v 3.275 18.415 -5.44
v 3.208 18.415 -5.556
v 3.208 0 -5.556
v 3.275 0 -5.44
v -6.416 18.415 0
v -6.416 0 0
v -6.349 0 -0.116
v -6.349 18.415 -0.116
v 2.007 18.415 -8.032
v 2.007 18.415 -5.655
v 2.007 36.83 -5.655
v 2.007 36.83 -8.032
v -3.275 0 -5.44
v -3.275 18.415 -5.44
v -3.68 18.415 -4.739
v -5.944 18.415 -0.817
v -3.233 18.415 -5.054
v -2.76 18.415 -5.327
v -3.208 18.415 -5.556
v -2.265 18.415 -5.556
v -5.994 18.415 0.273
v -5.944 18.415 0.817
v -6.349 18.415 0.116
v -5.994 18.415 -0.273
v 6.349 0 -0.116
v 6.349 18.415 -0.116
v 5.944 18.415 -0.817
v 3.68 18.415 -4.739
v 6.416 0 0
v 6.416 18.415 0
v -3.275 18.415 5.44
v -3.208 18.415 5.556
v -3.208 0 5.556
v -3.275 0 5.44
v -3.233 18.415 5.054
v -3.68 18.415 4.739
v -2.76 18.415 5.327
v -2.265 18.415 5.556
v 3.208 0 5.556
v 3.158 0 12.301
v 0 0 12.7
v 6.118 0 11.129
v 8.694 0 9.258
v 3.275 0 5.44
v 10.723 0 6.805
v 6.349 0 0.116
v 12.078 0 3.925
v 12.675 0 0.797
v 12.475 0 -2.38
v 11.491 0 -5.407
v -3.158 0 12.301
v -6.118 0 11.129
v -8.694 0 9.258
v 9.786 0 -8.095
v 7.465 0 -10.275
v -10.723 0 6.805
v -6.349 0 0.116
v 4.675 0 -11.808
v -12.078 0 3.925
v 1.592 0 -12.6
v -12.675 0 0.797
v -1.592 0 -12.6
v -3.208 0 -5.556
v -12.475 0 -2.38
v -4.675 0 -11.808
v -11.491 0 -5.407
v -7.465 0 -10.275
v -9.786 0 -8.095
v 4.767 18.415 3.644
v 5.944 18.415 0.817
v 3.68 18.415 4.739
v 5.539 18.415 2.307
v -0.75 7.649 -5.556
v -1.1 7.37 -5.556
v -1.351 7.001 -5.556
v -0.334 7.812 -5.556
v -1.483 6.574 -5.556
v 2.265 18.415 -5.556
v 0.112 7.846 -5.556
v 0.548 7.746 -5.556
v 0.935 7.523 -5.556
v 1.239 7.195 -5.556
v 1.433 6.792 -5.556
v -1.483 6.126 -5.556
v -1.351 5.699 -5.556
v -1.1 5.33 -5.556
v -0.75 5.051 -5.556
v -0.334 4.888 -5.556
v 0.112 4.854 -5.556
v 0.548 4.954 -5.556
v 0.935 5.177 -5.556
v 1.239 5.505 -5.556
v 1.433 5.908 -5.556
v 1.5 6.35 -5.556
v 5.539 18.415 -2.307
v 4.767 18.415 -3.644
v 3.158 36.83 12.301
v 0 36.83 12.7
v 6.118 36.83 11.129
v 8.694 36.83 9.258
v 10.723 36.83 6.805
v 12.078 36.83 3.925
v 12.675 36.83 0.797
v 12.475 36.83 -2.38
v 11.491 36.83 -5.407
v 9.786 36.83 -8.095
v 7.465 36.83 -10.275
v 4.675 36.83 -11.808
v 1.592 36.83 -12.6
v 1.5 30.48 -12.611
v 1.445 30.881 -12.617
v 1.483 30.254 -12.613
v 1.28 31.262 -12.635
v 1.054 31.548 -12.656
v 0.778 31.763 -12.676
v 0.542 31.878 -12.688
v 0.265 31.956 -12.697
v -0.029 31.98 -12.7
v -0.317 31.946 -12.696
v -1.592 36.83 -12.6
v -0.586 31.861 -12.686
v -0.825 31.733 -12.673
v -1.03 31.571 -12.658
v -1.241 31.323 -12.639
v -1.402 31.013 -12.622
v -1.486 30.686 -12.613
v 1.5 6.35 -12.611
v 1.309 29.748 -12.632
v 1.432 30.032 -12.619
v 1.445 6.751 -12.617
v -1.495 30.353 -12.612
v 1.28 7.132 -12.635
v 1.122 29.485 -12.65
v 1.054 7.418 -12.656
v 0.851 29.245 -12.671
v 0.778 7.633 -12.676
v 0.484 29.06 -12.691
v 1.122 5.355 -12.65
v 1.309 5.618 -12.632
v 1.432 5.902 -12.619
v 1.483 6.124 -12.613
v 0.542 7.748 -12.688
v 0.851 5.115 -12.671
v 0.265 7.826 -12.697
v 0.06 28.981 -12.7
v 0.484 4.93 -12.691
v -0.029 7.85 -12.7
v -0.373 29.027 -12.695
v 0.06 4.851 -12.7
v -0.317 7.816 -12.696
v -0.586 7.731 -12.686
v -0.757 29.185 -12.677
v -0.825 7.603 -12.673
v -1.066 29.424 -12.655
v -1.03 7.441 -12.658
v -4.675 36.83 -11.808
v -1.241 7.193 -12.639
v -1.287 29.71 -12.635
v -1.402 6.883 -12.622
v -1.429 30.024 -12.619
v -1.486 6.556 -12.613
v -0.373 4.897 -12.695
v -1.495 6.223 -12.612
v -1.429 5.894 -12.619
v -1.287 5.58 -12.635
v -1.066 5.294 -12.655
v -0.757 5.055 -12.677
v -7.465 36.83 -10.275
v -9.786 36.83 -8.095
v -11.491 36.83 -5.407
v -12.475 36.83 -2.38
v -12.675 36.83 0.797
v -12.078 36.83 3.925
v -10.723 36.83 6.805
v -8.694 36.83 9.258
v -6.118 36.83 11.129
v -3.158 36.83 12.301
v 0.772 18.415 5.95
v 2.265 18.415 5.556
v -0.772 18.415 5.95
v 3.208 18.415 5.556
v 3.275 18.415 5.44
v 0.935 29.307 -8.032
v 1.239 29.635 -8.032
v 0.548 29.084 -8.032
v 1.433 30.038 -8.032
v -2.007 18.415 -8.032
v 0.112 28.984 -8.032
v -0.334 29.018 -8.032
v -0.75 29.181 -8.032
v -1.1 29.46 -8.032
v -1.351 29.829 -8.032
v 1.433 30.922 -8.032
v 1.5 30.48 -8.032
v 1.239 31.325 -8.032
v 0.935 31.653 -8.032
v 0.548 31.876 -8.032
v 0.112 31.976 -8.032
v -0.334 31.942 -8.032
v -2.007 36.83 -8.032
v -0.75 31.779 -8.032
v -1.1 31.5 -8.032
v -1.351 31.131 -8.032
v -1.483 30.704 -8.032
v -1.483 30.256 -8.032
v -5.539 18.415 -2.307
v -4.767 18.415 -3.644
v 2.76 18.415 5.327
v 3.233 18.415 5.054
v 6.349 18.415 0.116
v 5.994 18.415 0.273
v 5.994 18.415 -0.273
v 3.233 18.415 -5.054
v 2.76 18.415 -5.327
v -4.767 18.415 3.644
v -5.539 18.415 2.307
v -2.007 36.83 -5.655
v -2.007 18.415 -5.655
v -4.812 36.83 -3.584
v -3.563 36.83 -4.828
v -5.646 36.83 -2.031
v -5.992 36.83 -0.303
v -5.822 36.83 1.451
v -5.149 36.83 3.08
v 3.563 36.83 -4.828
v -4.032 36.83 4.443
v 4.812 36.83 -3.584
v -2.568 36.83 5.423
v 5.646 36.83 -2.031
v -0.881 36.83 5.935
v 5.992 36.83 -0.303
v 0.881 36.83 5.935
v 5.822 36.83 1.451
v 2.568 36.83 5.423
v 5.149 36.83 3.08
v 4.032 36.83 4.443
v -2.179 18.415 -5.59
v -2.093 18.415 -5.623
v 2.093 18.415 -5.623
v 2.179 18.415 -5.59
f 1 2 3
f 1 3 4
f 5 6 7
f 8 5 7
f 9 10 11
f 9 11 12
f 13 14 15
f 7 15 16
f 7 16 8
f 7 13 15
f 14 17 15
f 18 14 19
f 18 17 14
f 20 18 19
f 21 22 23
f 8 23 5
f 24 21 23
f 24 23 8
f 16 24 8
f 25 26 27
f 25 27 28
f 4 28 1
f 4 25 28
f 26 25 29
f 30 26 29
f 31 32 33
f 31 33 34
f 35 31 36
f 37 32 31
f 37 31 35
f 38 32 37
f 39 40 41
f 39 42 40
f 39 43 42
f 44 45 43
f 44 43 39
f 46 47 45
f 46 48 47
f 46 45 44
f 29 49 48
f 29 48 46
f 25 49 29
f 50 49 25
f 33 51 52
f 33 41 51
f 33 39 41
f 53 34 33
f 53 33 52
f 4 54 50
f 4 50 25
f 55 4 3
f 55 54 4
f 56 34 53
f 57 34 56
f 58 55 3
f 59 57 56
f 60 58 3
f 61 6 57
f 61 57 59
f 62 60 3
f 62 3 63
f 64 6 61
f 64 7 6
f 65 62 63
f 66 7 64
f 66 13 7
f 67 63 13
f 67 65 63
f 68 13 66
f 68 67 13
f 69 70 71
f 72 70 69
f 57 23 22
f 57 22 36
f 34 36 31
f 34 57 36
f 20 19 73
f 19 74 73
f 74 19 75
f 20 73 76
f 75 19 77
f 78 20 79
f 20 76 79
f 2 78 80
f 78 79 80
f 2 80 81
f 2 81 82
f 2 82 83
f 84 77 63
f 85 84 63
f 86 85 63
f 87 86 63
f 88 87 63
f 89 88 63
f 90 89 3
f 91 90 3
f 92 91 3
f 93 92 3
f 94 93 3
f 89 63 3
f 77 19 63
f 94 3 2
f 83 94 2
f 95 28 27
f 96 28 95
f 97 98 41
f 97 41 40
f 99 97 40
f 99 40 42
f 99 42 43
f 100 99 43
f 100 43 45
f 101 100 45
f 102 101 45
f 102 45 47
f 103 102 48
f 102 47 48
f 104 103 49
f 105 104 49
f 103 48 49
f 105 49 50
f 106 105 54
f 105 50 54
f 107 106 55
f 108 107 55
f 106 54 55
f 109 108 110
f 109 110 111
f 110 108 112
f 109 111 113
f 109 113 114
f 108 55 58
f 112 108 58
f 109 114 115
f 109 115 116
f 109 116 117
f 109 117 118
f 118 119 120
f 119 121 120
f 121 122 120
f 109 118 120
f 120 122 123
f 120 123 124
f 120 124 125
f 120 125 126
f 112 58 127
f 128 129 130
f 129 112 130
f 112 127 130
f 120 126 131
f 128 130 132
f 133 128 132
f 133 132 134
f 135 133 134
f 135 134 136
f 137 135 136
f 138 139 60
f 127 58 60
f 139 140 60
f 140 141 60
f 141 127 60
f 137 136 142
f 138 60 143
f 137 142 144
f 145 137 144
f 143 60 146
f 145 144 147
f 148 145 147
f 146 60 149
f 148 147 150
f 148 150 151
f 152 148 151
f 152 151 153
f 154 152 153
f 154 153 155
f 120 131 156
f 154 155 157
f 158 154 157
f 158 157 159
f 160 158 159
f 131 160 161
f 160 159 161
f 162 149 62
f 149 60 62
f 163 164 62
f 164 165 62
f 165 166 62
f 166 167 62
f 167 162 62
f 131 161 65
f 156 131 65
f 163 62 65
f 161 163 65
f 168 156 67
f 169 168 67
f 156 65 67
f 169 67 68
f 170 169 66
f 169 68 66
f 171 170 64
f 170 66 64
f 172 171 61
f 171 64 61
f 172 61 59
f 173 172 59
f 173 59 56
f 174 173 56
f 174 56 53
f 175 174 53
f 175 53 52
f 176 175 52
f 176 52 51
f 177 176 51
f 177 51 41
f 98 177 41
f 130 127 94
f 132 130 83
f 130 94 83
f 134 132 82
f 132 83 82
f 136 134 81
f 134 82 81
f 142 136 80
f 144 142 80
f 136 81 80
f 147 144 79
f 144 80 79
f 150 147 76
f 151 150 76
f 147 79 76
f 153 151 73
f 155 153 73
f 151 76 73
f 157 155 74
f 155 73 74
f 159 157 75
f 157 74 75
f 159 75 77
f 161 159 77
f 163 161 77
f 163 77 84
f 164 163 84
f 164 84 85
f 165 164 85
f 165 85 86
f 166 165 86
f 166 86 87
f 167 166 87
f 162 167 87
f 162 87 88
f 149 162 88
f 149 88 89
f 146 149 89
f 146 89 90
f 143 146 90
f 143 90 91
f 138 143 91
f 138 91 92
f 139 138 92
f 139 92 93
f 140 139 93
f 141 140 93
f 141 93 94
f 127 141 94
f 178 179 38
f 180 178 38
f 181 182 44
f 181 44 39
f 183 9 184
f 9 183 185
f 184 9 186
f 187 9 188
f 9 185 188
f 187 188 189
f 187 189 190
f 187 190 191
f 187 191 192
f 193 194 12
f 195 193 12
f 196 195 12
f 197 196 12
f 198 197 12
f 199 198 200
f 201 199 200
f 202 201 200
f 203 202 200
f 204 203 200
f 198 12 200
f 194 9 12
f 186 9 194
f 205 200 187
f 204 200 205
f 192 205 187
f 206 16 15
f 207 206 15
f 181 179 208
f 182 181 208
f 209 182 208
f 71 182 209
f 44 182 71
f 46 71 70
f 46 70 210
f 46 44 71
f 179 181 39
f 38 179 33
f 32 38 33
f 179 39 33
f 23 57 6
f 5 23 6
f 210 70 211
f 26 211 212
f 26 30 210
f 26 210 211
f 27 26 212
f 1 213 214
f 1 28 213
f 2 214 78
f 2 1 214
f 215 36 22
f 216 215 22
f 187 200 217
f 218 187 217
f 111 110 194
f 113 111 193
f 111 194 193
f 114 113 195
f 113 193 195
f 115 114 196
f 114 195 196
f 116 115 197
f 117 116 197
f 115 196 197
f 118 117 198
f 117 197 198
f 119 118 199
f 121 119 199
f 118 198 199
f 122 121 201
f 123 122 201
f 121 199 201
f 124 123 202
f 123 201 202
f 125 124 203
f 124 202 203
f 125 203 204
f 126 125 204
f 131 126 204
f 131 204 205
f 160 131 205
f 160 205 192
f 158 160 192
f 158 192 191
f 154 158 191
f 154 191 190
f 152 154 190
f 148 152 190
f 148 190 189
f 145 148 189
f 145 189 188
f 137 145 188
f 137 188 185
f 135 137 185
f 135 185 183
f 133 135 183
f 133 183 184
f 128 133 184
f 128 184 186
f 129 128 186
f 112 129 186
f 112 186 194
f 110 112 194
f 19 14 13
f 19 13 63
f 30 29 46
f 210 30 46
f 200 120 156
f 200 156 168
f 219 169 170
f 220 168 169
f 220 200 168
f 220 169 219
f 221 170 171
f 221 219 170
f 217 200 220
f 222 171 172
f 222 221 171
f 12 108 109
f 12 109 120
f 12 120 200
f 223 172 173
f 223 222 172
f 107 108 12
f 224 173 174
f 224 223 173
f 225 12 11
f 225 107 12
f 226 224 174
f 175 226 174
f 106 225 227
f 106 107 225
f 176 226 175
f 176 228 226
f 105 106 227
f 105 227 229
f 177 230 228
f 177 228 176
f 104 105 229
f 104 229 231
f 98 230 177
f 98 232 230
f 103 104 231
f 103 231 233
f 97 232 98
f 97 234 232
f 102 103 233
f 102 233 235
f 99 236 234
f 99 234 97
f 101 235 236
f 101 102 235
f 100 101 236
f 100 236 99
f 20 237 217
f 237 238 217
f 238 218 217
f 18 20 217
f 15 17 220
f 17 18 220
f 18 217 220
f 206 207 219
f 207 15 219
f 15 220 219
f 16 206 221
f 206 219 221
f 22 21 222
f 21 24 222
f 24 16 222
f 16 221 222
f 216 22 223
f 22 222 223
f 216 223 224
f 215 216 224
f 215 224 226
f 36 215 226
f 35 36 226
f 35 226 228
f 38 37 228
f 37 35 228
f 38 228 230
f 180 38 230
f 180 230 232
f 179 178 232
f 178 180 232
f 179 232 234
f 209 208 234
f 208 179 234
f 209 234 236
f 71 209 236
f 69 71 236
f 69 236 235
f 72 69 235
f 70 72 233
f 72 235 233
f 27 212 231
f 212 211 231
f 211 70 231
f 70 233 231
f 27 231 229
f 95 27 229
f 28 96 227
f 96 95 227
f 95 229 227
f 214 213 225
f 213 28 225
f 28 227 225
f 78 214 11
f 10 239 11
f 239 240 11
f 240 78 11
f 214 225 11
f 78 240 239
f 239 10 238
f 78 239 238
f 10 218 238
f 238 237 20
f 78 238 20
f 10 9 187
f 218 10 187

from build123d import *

# Parameters (mm, degrees)
SKETCH1_R               = 12.7
BOSS_EXTRUDE1_DEPTH     = 36.83
SKETCH3_R               = 6.35
CUT_EXTRUDE1_DEPTH      = 18.415
CUT_EXTRUDE2_REACH      = 42.976
SKETCH4_R               = 6
CUT_EXTRUDE3_DEPTH      = 18.415
BOSS_EXTRUDE2_DEPTH     = 18.415
CUT_EXTRUDE6_DEPTH      = 18.415
CUT_EXTRUDE4_REACH      = 42.976
CUT_EXTRUDE4_END_RADIUS = 12.7
SKETCH6_R               = 1.5


with BuildPart() as part:
    # Sketch1 → Boss-Extrude1 (new body)
    with BuildSketch(Plane(origin=(0, 0, 0), x_dir=(1, 0, 0), z_dir=(0, 1, 0))):
        with Locations(Location((0, 0, 0), (0, 0, 270))):
            Circle(SKETCH1_R)
    extrude(amount=BOSS_EXTRUDE1_DEPTH)

    # Sketch3 → Cut-Extrude1 (cut)
    with BuildSketch(Plane(origin=(0, 0, 0), x_dir=(-1, 0, 0), z_dir=(0, -1, 0))):
        with Locations(Location((0, 0, 0), (0, 0, 90))):
            Circle(SKETCH3_R)
    extrude(amount=-CUT_EXTRUDE1_DEPTH, mode=Mode.SUBTRACT)

    # Sketch4 → Cut-Extrude2 (cut, up to next)
    with BuildSketch(Plane(origin=(0, 36.83, 0), x_dir=(1, 0, 0), z_dir=(0, 1, 0)), mode=Mode.PRIVATE) as cut_extrude2_sk1:
        with Locations(Location((0, 0, 0), (0, 0, 270))):
            Circle(SKETCH4_R)
    cut_extrude2_tool1 = extrude(cut_extrude2_sk1.sketch, amount=-CUT_EXTRUDE2_REACH, mode=Mode.PRIVATE) & part.part
    add(cut_extrude2_tool1.solids().sort_by_distance((0, 36.83, 0))[0], mode=Mode.SUBTRACT)

    # Sketch5 → Cut-Extrude3 (cut)
    with BuildSketch(Plane(origin=(0, 36.83, 0), x_dir=(1, 0, 0), z_dir=(0, 1, 0))):
        with BuildLine():
            Line((0, 8.032), (-2.0066, 8.032))
            Line((-2.0066, 8.032), (-2.0066, 5.654516464))
            ThreePointArc((-2.0066, 5.654516464), (0, 6), (2.0066, 5.654516464))
            Line((2.0066, 5.654516464), (2.0066, 8.032))
            Line((2.0066, 8.032), (0, 8.032))
        make_face()
    extrude(amount=-CUT_EXTRUDE3_DEPTH, mode=Mode.SUBTRACT)

    # Sketch9 → Boss-Extrude2 (add)
    with BuildSketch(Plane(origin=(0, 0, 0), x_dir=(-1, 0, 0), z_dir=(0, -1, 0))):
        with BuildLine():
            Line((3.274763384, 5.440443436), (6.348943915, 0.115806564))
            ThreePointArc((6.348943915, 0.115806564), (5.499261314, 3.175), (3.274763384, 5.440443436))
        make_face()
        with BuildLine():
            ThreePointArc((3.274763384, -5.440443436), (5.499261314, -3.175), (6.348943915, -0.115806564))
            Line((6.348943915, -0.115806564), (3.274763384, -5.440443436))
        make_face()
        with BuildLine():
            ThreePointArc((-3.074180531, -5.55625), (0, -6.35), (3.074180531, -5.55625))
            Line((3.074180531, -5.55625), (-3.074180531, -5.55625))
        make_face()
        with BuildLine():
            ThreePointArc((-6.348943915, -0.115806564), (-5.499261314, -3.175), (-3.274763384, -5.440443436))
            Line((-3.274763384, -5.440443436), (-6.348943915, -0.115806564))
        make_face()
        with BuildLine():
            Line((-6.348943915, 0.115806564), (-3.274763384, 5.440443436))
            ThreePointArc((-3.274763384, 5.440443436), (-5.499261314, 3.175), (-6.348943915, 0.115806564))
        make_face()
        with BuildLine():
            Line((-3.074180531, 5.55625), (3.074180531, 5.55625))
            ThreePointArc((3.074180531, 5.55625), (0, 6.35), (-3.074180531, 5.55625))
        make_face()
    extrude(amount=-BOSS_EXTRUDE2_DEPTH)

    # Sketch9<3> → Cut-Extrude6 (cut)
    with BuildSketch(Plane(origin=(0, 0, 0), x_dir=(-1, 0, 0), z_dir=(0, -1, 0))):
        with BuildLine():
            Line((-3.207902433, -5.55625), (-3.074180531, -5.55625))
            ThreePointArc((-3.074180531, -5.55625), (-3.175, -5.499261314), (-3.274763384, -5.440443436))
            Line((-3.274763384, -5.440443436), (-3.207902433, -5.55625))
        make_face()
        with BuildLine():
            ThreePointArc((-6.348943915, -0.115806564), (-6.35, 0), (-6.348943915, 0.115806564))
            Line((-6.348943915, 0.115806564), (-6.415804866, 0))
            Line((-6.415804866, 0), (-6.348943915, -0.115806564))
        make_face()
        with BuildLine():
            ThreePointArc((-3.274763384, 5.440443436), (-3.175, 5.499261314), (-3.074180531, 5.55625))
            Line((-3.074180531, 5.55625), (-3.207902433, 5.55625))
            Line((-3.207902433, 5.55625), (-3.274763384, 5.440443436))
        make_face()
        with BuildLine():
            ThreePointArc((3.074180531, 5.55625), (3.175, 5.499261314), (3.274763384, 5.440443436))
            Line((3.274763384, 5.440443436), (3.207902433, 5.55625))
            Line((3.207902433, 5.55625), (3.074180531, 5.55625))
        make_face()
        with BuildLine():
            Line((6.348943915, -0.115806564), (6.415804866, 0))
            Line((6.415804866, 0), (6.348943915, 0.115806564))
            ThreePointArc((6.348943915, 0.115806564), (6.349735973, 0.05790569), (6.35, 0))
            ThreePointArc((6.35, 0), (6.349735973, -0.05790569), (6.348943915, -0.115806564))
        make_face()
        with BuildLine():
            Line((3.207902433, -5.55625), (3.274763384, -5.440443436))
            ThreePointArc((3.274763384, -5.440443436), (3.175, -5.499261314), (3.074180531, -5.55625))
            Line((3.074180531, -5.55625), (3.207902433, -5.55625))
        make_face()
    extrude(amount=-CUT_EXTRUDE6_DEPTH, mode=Mode.SUBTRACT)

    # Cut-Extrude4: up to this cylinder (the profile starts inside it)
    cut_extrude4_end = Plane(origin=(0, 18.415, 0), z_dir=(0, -1, 0)) * Cylinder(CUT_EXTRUDE4_END_RADIUS, 136.482, mode=Mode.PRIVATE)
    # Sketch6 → Cut-Extrude4 (cut, up to the surface)
    with BuildSketch(Plane.XY, mode=Mode.PRIVATE) as cut_extrude4_sk1:
        with Locations((0, 30.48)):
            Circle(SKETCH6_R)
    cut_extrude4_tool1 = extrude(cut_extrude4_sk1.sketch, amount=-CUT_EXTRUDE4_REACH, mode=Mode.PRIVATE) & cut_extrude4_end
    add(cut_extrude4_tool1.solids().sort_by_distance((0, 30.48, 0))[0], mode=Mode.SUBTRACT)
    # Sketch6 → Cut-Extrude4 (cut, up to the surface)
    with BuildSketch(Plane.XY, mode=Mode.PRIVATE) as cut_extrude4_sk2:
        with Locations((0, 6.35)):
            Circle(SKETCH6_R)
    cut_extrude4_tool2 = extrude(cut_extrude4_sk2.sketch, amount=-CUT_EXTRUDE4_REACH, mode=Mode.PRIVATE) & cut_extrude4_end
    add(cut_extrude4_tool2.solids().sort_by_distance((0, 6.35, 0))[0], mode=Mode.SUBTRACT)


solid = part.part
